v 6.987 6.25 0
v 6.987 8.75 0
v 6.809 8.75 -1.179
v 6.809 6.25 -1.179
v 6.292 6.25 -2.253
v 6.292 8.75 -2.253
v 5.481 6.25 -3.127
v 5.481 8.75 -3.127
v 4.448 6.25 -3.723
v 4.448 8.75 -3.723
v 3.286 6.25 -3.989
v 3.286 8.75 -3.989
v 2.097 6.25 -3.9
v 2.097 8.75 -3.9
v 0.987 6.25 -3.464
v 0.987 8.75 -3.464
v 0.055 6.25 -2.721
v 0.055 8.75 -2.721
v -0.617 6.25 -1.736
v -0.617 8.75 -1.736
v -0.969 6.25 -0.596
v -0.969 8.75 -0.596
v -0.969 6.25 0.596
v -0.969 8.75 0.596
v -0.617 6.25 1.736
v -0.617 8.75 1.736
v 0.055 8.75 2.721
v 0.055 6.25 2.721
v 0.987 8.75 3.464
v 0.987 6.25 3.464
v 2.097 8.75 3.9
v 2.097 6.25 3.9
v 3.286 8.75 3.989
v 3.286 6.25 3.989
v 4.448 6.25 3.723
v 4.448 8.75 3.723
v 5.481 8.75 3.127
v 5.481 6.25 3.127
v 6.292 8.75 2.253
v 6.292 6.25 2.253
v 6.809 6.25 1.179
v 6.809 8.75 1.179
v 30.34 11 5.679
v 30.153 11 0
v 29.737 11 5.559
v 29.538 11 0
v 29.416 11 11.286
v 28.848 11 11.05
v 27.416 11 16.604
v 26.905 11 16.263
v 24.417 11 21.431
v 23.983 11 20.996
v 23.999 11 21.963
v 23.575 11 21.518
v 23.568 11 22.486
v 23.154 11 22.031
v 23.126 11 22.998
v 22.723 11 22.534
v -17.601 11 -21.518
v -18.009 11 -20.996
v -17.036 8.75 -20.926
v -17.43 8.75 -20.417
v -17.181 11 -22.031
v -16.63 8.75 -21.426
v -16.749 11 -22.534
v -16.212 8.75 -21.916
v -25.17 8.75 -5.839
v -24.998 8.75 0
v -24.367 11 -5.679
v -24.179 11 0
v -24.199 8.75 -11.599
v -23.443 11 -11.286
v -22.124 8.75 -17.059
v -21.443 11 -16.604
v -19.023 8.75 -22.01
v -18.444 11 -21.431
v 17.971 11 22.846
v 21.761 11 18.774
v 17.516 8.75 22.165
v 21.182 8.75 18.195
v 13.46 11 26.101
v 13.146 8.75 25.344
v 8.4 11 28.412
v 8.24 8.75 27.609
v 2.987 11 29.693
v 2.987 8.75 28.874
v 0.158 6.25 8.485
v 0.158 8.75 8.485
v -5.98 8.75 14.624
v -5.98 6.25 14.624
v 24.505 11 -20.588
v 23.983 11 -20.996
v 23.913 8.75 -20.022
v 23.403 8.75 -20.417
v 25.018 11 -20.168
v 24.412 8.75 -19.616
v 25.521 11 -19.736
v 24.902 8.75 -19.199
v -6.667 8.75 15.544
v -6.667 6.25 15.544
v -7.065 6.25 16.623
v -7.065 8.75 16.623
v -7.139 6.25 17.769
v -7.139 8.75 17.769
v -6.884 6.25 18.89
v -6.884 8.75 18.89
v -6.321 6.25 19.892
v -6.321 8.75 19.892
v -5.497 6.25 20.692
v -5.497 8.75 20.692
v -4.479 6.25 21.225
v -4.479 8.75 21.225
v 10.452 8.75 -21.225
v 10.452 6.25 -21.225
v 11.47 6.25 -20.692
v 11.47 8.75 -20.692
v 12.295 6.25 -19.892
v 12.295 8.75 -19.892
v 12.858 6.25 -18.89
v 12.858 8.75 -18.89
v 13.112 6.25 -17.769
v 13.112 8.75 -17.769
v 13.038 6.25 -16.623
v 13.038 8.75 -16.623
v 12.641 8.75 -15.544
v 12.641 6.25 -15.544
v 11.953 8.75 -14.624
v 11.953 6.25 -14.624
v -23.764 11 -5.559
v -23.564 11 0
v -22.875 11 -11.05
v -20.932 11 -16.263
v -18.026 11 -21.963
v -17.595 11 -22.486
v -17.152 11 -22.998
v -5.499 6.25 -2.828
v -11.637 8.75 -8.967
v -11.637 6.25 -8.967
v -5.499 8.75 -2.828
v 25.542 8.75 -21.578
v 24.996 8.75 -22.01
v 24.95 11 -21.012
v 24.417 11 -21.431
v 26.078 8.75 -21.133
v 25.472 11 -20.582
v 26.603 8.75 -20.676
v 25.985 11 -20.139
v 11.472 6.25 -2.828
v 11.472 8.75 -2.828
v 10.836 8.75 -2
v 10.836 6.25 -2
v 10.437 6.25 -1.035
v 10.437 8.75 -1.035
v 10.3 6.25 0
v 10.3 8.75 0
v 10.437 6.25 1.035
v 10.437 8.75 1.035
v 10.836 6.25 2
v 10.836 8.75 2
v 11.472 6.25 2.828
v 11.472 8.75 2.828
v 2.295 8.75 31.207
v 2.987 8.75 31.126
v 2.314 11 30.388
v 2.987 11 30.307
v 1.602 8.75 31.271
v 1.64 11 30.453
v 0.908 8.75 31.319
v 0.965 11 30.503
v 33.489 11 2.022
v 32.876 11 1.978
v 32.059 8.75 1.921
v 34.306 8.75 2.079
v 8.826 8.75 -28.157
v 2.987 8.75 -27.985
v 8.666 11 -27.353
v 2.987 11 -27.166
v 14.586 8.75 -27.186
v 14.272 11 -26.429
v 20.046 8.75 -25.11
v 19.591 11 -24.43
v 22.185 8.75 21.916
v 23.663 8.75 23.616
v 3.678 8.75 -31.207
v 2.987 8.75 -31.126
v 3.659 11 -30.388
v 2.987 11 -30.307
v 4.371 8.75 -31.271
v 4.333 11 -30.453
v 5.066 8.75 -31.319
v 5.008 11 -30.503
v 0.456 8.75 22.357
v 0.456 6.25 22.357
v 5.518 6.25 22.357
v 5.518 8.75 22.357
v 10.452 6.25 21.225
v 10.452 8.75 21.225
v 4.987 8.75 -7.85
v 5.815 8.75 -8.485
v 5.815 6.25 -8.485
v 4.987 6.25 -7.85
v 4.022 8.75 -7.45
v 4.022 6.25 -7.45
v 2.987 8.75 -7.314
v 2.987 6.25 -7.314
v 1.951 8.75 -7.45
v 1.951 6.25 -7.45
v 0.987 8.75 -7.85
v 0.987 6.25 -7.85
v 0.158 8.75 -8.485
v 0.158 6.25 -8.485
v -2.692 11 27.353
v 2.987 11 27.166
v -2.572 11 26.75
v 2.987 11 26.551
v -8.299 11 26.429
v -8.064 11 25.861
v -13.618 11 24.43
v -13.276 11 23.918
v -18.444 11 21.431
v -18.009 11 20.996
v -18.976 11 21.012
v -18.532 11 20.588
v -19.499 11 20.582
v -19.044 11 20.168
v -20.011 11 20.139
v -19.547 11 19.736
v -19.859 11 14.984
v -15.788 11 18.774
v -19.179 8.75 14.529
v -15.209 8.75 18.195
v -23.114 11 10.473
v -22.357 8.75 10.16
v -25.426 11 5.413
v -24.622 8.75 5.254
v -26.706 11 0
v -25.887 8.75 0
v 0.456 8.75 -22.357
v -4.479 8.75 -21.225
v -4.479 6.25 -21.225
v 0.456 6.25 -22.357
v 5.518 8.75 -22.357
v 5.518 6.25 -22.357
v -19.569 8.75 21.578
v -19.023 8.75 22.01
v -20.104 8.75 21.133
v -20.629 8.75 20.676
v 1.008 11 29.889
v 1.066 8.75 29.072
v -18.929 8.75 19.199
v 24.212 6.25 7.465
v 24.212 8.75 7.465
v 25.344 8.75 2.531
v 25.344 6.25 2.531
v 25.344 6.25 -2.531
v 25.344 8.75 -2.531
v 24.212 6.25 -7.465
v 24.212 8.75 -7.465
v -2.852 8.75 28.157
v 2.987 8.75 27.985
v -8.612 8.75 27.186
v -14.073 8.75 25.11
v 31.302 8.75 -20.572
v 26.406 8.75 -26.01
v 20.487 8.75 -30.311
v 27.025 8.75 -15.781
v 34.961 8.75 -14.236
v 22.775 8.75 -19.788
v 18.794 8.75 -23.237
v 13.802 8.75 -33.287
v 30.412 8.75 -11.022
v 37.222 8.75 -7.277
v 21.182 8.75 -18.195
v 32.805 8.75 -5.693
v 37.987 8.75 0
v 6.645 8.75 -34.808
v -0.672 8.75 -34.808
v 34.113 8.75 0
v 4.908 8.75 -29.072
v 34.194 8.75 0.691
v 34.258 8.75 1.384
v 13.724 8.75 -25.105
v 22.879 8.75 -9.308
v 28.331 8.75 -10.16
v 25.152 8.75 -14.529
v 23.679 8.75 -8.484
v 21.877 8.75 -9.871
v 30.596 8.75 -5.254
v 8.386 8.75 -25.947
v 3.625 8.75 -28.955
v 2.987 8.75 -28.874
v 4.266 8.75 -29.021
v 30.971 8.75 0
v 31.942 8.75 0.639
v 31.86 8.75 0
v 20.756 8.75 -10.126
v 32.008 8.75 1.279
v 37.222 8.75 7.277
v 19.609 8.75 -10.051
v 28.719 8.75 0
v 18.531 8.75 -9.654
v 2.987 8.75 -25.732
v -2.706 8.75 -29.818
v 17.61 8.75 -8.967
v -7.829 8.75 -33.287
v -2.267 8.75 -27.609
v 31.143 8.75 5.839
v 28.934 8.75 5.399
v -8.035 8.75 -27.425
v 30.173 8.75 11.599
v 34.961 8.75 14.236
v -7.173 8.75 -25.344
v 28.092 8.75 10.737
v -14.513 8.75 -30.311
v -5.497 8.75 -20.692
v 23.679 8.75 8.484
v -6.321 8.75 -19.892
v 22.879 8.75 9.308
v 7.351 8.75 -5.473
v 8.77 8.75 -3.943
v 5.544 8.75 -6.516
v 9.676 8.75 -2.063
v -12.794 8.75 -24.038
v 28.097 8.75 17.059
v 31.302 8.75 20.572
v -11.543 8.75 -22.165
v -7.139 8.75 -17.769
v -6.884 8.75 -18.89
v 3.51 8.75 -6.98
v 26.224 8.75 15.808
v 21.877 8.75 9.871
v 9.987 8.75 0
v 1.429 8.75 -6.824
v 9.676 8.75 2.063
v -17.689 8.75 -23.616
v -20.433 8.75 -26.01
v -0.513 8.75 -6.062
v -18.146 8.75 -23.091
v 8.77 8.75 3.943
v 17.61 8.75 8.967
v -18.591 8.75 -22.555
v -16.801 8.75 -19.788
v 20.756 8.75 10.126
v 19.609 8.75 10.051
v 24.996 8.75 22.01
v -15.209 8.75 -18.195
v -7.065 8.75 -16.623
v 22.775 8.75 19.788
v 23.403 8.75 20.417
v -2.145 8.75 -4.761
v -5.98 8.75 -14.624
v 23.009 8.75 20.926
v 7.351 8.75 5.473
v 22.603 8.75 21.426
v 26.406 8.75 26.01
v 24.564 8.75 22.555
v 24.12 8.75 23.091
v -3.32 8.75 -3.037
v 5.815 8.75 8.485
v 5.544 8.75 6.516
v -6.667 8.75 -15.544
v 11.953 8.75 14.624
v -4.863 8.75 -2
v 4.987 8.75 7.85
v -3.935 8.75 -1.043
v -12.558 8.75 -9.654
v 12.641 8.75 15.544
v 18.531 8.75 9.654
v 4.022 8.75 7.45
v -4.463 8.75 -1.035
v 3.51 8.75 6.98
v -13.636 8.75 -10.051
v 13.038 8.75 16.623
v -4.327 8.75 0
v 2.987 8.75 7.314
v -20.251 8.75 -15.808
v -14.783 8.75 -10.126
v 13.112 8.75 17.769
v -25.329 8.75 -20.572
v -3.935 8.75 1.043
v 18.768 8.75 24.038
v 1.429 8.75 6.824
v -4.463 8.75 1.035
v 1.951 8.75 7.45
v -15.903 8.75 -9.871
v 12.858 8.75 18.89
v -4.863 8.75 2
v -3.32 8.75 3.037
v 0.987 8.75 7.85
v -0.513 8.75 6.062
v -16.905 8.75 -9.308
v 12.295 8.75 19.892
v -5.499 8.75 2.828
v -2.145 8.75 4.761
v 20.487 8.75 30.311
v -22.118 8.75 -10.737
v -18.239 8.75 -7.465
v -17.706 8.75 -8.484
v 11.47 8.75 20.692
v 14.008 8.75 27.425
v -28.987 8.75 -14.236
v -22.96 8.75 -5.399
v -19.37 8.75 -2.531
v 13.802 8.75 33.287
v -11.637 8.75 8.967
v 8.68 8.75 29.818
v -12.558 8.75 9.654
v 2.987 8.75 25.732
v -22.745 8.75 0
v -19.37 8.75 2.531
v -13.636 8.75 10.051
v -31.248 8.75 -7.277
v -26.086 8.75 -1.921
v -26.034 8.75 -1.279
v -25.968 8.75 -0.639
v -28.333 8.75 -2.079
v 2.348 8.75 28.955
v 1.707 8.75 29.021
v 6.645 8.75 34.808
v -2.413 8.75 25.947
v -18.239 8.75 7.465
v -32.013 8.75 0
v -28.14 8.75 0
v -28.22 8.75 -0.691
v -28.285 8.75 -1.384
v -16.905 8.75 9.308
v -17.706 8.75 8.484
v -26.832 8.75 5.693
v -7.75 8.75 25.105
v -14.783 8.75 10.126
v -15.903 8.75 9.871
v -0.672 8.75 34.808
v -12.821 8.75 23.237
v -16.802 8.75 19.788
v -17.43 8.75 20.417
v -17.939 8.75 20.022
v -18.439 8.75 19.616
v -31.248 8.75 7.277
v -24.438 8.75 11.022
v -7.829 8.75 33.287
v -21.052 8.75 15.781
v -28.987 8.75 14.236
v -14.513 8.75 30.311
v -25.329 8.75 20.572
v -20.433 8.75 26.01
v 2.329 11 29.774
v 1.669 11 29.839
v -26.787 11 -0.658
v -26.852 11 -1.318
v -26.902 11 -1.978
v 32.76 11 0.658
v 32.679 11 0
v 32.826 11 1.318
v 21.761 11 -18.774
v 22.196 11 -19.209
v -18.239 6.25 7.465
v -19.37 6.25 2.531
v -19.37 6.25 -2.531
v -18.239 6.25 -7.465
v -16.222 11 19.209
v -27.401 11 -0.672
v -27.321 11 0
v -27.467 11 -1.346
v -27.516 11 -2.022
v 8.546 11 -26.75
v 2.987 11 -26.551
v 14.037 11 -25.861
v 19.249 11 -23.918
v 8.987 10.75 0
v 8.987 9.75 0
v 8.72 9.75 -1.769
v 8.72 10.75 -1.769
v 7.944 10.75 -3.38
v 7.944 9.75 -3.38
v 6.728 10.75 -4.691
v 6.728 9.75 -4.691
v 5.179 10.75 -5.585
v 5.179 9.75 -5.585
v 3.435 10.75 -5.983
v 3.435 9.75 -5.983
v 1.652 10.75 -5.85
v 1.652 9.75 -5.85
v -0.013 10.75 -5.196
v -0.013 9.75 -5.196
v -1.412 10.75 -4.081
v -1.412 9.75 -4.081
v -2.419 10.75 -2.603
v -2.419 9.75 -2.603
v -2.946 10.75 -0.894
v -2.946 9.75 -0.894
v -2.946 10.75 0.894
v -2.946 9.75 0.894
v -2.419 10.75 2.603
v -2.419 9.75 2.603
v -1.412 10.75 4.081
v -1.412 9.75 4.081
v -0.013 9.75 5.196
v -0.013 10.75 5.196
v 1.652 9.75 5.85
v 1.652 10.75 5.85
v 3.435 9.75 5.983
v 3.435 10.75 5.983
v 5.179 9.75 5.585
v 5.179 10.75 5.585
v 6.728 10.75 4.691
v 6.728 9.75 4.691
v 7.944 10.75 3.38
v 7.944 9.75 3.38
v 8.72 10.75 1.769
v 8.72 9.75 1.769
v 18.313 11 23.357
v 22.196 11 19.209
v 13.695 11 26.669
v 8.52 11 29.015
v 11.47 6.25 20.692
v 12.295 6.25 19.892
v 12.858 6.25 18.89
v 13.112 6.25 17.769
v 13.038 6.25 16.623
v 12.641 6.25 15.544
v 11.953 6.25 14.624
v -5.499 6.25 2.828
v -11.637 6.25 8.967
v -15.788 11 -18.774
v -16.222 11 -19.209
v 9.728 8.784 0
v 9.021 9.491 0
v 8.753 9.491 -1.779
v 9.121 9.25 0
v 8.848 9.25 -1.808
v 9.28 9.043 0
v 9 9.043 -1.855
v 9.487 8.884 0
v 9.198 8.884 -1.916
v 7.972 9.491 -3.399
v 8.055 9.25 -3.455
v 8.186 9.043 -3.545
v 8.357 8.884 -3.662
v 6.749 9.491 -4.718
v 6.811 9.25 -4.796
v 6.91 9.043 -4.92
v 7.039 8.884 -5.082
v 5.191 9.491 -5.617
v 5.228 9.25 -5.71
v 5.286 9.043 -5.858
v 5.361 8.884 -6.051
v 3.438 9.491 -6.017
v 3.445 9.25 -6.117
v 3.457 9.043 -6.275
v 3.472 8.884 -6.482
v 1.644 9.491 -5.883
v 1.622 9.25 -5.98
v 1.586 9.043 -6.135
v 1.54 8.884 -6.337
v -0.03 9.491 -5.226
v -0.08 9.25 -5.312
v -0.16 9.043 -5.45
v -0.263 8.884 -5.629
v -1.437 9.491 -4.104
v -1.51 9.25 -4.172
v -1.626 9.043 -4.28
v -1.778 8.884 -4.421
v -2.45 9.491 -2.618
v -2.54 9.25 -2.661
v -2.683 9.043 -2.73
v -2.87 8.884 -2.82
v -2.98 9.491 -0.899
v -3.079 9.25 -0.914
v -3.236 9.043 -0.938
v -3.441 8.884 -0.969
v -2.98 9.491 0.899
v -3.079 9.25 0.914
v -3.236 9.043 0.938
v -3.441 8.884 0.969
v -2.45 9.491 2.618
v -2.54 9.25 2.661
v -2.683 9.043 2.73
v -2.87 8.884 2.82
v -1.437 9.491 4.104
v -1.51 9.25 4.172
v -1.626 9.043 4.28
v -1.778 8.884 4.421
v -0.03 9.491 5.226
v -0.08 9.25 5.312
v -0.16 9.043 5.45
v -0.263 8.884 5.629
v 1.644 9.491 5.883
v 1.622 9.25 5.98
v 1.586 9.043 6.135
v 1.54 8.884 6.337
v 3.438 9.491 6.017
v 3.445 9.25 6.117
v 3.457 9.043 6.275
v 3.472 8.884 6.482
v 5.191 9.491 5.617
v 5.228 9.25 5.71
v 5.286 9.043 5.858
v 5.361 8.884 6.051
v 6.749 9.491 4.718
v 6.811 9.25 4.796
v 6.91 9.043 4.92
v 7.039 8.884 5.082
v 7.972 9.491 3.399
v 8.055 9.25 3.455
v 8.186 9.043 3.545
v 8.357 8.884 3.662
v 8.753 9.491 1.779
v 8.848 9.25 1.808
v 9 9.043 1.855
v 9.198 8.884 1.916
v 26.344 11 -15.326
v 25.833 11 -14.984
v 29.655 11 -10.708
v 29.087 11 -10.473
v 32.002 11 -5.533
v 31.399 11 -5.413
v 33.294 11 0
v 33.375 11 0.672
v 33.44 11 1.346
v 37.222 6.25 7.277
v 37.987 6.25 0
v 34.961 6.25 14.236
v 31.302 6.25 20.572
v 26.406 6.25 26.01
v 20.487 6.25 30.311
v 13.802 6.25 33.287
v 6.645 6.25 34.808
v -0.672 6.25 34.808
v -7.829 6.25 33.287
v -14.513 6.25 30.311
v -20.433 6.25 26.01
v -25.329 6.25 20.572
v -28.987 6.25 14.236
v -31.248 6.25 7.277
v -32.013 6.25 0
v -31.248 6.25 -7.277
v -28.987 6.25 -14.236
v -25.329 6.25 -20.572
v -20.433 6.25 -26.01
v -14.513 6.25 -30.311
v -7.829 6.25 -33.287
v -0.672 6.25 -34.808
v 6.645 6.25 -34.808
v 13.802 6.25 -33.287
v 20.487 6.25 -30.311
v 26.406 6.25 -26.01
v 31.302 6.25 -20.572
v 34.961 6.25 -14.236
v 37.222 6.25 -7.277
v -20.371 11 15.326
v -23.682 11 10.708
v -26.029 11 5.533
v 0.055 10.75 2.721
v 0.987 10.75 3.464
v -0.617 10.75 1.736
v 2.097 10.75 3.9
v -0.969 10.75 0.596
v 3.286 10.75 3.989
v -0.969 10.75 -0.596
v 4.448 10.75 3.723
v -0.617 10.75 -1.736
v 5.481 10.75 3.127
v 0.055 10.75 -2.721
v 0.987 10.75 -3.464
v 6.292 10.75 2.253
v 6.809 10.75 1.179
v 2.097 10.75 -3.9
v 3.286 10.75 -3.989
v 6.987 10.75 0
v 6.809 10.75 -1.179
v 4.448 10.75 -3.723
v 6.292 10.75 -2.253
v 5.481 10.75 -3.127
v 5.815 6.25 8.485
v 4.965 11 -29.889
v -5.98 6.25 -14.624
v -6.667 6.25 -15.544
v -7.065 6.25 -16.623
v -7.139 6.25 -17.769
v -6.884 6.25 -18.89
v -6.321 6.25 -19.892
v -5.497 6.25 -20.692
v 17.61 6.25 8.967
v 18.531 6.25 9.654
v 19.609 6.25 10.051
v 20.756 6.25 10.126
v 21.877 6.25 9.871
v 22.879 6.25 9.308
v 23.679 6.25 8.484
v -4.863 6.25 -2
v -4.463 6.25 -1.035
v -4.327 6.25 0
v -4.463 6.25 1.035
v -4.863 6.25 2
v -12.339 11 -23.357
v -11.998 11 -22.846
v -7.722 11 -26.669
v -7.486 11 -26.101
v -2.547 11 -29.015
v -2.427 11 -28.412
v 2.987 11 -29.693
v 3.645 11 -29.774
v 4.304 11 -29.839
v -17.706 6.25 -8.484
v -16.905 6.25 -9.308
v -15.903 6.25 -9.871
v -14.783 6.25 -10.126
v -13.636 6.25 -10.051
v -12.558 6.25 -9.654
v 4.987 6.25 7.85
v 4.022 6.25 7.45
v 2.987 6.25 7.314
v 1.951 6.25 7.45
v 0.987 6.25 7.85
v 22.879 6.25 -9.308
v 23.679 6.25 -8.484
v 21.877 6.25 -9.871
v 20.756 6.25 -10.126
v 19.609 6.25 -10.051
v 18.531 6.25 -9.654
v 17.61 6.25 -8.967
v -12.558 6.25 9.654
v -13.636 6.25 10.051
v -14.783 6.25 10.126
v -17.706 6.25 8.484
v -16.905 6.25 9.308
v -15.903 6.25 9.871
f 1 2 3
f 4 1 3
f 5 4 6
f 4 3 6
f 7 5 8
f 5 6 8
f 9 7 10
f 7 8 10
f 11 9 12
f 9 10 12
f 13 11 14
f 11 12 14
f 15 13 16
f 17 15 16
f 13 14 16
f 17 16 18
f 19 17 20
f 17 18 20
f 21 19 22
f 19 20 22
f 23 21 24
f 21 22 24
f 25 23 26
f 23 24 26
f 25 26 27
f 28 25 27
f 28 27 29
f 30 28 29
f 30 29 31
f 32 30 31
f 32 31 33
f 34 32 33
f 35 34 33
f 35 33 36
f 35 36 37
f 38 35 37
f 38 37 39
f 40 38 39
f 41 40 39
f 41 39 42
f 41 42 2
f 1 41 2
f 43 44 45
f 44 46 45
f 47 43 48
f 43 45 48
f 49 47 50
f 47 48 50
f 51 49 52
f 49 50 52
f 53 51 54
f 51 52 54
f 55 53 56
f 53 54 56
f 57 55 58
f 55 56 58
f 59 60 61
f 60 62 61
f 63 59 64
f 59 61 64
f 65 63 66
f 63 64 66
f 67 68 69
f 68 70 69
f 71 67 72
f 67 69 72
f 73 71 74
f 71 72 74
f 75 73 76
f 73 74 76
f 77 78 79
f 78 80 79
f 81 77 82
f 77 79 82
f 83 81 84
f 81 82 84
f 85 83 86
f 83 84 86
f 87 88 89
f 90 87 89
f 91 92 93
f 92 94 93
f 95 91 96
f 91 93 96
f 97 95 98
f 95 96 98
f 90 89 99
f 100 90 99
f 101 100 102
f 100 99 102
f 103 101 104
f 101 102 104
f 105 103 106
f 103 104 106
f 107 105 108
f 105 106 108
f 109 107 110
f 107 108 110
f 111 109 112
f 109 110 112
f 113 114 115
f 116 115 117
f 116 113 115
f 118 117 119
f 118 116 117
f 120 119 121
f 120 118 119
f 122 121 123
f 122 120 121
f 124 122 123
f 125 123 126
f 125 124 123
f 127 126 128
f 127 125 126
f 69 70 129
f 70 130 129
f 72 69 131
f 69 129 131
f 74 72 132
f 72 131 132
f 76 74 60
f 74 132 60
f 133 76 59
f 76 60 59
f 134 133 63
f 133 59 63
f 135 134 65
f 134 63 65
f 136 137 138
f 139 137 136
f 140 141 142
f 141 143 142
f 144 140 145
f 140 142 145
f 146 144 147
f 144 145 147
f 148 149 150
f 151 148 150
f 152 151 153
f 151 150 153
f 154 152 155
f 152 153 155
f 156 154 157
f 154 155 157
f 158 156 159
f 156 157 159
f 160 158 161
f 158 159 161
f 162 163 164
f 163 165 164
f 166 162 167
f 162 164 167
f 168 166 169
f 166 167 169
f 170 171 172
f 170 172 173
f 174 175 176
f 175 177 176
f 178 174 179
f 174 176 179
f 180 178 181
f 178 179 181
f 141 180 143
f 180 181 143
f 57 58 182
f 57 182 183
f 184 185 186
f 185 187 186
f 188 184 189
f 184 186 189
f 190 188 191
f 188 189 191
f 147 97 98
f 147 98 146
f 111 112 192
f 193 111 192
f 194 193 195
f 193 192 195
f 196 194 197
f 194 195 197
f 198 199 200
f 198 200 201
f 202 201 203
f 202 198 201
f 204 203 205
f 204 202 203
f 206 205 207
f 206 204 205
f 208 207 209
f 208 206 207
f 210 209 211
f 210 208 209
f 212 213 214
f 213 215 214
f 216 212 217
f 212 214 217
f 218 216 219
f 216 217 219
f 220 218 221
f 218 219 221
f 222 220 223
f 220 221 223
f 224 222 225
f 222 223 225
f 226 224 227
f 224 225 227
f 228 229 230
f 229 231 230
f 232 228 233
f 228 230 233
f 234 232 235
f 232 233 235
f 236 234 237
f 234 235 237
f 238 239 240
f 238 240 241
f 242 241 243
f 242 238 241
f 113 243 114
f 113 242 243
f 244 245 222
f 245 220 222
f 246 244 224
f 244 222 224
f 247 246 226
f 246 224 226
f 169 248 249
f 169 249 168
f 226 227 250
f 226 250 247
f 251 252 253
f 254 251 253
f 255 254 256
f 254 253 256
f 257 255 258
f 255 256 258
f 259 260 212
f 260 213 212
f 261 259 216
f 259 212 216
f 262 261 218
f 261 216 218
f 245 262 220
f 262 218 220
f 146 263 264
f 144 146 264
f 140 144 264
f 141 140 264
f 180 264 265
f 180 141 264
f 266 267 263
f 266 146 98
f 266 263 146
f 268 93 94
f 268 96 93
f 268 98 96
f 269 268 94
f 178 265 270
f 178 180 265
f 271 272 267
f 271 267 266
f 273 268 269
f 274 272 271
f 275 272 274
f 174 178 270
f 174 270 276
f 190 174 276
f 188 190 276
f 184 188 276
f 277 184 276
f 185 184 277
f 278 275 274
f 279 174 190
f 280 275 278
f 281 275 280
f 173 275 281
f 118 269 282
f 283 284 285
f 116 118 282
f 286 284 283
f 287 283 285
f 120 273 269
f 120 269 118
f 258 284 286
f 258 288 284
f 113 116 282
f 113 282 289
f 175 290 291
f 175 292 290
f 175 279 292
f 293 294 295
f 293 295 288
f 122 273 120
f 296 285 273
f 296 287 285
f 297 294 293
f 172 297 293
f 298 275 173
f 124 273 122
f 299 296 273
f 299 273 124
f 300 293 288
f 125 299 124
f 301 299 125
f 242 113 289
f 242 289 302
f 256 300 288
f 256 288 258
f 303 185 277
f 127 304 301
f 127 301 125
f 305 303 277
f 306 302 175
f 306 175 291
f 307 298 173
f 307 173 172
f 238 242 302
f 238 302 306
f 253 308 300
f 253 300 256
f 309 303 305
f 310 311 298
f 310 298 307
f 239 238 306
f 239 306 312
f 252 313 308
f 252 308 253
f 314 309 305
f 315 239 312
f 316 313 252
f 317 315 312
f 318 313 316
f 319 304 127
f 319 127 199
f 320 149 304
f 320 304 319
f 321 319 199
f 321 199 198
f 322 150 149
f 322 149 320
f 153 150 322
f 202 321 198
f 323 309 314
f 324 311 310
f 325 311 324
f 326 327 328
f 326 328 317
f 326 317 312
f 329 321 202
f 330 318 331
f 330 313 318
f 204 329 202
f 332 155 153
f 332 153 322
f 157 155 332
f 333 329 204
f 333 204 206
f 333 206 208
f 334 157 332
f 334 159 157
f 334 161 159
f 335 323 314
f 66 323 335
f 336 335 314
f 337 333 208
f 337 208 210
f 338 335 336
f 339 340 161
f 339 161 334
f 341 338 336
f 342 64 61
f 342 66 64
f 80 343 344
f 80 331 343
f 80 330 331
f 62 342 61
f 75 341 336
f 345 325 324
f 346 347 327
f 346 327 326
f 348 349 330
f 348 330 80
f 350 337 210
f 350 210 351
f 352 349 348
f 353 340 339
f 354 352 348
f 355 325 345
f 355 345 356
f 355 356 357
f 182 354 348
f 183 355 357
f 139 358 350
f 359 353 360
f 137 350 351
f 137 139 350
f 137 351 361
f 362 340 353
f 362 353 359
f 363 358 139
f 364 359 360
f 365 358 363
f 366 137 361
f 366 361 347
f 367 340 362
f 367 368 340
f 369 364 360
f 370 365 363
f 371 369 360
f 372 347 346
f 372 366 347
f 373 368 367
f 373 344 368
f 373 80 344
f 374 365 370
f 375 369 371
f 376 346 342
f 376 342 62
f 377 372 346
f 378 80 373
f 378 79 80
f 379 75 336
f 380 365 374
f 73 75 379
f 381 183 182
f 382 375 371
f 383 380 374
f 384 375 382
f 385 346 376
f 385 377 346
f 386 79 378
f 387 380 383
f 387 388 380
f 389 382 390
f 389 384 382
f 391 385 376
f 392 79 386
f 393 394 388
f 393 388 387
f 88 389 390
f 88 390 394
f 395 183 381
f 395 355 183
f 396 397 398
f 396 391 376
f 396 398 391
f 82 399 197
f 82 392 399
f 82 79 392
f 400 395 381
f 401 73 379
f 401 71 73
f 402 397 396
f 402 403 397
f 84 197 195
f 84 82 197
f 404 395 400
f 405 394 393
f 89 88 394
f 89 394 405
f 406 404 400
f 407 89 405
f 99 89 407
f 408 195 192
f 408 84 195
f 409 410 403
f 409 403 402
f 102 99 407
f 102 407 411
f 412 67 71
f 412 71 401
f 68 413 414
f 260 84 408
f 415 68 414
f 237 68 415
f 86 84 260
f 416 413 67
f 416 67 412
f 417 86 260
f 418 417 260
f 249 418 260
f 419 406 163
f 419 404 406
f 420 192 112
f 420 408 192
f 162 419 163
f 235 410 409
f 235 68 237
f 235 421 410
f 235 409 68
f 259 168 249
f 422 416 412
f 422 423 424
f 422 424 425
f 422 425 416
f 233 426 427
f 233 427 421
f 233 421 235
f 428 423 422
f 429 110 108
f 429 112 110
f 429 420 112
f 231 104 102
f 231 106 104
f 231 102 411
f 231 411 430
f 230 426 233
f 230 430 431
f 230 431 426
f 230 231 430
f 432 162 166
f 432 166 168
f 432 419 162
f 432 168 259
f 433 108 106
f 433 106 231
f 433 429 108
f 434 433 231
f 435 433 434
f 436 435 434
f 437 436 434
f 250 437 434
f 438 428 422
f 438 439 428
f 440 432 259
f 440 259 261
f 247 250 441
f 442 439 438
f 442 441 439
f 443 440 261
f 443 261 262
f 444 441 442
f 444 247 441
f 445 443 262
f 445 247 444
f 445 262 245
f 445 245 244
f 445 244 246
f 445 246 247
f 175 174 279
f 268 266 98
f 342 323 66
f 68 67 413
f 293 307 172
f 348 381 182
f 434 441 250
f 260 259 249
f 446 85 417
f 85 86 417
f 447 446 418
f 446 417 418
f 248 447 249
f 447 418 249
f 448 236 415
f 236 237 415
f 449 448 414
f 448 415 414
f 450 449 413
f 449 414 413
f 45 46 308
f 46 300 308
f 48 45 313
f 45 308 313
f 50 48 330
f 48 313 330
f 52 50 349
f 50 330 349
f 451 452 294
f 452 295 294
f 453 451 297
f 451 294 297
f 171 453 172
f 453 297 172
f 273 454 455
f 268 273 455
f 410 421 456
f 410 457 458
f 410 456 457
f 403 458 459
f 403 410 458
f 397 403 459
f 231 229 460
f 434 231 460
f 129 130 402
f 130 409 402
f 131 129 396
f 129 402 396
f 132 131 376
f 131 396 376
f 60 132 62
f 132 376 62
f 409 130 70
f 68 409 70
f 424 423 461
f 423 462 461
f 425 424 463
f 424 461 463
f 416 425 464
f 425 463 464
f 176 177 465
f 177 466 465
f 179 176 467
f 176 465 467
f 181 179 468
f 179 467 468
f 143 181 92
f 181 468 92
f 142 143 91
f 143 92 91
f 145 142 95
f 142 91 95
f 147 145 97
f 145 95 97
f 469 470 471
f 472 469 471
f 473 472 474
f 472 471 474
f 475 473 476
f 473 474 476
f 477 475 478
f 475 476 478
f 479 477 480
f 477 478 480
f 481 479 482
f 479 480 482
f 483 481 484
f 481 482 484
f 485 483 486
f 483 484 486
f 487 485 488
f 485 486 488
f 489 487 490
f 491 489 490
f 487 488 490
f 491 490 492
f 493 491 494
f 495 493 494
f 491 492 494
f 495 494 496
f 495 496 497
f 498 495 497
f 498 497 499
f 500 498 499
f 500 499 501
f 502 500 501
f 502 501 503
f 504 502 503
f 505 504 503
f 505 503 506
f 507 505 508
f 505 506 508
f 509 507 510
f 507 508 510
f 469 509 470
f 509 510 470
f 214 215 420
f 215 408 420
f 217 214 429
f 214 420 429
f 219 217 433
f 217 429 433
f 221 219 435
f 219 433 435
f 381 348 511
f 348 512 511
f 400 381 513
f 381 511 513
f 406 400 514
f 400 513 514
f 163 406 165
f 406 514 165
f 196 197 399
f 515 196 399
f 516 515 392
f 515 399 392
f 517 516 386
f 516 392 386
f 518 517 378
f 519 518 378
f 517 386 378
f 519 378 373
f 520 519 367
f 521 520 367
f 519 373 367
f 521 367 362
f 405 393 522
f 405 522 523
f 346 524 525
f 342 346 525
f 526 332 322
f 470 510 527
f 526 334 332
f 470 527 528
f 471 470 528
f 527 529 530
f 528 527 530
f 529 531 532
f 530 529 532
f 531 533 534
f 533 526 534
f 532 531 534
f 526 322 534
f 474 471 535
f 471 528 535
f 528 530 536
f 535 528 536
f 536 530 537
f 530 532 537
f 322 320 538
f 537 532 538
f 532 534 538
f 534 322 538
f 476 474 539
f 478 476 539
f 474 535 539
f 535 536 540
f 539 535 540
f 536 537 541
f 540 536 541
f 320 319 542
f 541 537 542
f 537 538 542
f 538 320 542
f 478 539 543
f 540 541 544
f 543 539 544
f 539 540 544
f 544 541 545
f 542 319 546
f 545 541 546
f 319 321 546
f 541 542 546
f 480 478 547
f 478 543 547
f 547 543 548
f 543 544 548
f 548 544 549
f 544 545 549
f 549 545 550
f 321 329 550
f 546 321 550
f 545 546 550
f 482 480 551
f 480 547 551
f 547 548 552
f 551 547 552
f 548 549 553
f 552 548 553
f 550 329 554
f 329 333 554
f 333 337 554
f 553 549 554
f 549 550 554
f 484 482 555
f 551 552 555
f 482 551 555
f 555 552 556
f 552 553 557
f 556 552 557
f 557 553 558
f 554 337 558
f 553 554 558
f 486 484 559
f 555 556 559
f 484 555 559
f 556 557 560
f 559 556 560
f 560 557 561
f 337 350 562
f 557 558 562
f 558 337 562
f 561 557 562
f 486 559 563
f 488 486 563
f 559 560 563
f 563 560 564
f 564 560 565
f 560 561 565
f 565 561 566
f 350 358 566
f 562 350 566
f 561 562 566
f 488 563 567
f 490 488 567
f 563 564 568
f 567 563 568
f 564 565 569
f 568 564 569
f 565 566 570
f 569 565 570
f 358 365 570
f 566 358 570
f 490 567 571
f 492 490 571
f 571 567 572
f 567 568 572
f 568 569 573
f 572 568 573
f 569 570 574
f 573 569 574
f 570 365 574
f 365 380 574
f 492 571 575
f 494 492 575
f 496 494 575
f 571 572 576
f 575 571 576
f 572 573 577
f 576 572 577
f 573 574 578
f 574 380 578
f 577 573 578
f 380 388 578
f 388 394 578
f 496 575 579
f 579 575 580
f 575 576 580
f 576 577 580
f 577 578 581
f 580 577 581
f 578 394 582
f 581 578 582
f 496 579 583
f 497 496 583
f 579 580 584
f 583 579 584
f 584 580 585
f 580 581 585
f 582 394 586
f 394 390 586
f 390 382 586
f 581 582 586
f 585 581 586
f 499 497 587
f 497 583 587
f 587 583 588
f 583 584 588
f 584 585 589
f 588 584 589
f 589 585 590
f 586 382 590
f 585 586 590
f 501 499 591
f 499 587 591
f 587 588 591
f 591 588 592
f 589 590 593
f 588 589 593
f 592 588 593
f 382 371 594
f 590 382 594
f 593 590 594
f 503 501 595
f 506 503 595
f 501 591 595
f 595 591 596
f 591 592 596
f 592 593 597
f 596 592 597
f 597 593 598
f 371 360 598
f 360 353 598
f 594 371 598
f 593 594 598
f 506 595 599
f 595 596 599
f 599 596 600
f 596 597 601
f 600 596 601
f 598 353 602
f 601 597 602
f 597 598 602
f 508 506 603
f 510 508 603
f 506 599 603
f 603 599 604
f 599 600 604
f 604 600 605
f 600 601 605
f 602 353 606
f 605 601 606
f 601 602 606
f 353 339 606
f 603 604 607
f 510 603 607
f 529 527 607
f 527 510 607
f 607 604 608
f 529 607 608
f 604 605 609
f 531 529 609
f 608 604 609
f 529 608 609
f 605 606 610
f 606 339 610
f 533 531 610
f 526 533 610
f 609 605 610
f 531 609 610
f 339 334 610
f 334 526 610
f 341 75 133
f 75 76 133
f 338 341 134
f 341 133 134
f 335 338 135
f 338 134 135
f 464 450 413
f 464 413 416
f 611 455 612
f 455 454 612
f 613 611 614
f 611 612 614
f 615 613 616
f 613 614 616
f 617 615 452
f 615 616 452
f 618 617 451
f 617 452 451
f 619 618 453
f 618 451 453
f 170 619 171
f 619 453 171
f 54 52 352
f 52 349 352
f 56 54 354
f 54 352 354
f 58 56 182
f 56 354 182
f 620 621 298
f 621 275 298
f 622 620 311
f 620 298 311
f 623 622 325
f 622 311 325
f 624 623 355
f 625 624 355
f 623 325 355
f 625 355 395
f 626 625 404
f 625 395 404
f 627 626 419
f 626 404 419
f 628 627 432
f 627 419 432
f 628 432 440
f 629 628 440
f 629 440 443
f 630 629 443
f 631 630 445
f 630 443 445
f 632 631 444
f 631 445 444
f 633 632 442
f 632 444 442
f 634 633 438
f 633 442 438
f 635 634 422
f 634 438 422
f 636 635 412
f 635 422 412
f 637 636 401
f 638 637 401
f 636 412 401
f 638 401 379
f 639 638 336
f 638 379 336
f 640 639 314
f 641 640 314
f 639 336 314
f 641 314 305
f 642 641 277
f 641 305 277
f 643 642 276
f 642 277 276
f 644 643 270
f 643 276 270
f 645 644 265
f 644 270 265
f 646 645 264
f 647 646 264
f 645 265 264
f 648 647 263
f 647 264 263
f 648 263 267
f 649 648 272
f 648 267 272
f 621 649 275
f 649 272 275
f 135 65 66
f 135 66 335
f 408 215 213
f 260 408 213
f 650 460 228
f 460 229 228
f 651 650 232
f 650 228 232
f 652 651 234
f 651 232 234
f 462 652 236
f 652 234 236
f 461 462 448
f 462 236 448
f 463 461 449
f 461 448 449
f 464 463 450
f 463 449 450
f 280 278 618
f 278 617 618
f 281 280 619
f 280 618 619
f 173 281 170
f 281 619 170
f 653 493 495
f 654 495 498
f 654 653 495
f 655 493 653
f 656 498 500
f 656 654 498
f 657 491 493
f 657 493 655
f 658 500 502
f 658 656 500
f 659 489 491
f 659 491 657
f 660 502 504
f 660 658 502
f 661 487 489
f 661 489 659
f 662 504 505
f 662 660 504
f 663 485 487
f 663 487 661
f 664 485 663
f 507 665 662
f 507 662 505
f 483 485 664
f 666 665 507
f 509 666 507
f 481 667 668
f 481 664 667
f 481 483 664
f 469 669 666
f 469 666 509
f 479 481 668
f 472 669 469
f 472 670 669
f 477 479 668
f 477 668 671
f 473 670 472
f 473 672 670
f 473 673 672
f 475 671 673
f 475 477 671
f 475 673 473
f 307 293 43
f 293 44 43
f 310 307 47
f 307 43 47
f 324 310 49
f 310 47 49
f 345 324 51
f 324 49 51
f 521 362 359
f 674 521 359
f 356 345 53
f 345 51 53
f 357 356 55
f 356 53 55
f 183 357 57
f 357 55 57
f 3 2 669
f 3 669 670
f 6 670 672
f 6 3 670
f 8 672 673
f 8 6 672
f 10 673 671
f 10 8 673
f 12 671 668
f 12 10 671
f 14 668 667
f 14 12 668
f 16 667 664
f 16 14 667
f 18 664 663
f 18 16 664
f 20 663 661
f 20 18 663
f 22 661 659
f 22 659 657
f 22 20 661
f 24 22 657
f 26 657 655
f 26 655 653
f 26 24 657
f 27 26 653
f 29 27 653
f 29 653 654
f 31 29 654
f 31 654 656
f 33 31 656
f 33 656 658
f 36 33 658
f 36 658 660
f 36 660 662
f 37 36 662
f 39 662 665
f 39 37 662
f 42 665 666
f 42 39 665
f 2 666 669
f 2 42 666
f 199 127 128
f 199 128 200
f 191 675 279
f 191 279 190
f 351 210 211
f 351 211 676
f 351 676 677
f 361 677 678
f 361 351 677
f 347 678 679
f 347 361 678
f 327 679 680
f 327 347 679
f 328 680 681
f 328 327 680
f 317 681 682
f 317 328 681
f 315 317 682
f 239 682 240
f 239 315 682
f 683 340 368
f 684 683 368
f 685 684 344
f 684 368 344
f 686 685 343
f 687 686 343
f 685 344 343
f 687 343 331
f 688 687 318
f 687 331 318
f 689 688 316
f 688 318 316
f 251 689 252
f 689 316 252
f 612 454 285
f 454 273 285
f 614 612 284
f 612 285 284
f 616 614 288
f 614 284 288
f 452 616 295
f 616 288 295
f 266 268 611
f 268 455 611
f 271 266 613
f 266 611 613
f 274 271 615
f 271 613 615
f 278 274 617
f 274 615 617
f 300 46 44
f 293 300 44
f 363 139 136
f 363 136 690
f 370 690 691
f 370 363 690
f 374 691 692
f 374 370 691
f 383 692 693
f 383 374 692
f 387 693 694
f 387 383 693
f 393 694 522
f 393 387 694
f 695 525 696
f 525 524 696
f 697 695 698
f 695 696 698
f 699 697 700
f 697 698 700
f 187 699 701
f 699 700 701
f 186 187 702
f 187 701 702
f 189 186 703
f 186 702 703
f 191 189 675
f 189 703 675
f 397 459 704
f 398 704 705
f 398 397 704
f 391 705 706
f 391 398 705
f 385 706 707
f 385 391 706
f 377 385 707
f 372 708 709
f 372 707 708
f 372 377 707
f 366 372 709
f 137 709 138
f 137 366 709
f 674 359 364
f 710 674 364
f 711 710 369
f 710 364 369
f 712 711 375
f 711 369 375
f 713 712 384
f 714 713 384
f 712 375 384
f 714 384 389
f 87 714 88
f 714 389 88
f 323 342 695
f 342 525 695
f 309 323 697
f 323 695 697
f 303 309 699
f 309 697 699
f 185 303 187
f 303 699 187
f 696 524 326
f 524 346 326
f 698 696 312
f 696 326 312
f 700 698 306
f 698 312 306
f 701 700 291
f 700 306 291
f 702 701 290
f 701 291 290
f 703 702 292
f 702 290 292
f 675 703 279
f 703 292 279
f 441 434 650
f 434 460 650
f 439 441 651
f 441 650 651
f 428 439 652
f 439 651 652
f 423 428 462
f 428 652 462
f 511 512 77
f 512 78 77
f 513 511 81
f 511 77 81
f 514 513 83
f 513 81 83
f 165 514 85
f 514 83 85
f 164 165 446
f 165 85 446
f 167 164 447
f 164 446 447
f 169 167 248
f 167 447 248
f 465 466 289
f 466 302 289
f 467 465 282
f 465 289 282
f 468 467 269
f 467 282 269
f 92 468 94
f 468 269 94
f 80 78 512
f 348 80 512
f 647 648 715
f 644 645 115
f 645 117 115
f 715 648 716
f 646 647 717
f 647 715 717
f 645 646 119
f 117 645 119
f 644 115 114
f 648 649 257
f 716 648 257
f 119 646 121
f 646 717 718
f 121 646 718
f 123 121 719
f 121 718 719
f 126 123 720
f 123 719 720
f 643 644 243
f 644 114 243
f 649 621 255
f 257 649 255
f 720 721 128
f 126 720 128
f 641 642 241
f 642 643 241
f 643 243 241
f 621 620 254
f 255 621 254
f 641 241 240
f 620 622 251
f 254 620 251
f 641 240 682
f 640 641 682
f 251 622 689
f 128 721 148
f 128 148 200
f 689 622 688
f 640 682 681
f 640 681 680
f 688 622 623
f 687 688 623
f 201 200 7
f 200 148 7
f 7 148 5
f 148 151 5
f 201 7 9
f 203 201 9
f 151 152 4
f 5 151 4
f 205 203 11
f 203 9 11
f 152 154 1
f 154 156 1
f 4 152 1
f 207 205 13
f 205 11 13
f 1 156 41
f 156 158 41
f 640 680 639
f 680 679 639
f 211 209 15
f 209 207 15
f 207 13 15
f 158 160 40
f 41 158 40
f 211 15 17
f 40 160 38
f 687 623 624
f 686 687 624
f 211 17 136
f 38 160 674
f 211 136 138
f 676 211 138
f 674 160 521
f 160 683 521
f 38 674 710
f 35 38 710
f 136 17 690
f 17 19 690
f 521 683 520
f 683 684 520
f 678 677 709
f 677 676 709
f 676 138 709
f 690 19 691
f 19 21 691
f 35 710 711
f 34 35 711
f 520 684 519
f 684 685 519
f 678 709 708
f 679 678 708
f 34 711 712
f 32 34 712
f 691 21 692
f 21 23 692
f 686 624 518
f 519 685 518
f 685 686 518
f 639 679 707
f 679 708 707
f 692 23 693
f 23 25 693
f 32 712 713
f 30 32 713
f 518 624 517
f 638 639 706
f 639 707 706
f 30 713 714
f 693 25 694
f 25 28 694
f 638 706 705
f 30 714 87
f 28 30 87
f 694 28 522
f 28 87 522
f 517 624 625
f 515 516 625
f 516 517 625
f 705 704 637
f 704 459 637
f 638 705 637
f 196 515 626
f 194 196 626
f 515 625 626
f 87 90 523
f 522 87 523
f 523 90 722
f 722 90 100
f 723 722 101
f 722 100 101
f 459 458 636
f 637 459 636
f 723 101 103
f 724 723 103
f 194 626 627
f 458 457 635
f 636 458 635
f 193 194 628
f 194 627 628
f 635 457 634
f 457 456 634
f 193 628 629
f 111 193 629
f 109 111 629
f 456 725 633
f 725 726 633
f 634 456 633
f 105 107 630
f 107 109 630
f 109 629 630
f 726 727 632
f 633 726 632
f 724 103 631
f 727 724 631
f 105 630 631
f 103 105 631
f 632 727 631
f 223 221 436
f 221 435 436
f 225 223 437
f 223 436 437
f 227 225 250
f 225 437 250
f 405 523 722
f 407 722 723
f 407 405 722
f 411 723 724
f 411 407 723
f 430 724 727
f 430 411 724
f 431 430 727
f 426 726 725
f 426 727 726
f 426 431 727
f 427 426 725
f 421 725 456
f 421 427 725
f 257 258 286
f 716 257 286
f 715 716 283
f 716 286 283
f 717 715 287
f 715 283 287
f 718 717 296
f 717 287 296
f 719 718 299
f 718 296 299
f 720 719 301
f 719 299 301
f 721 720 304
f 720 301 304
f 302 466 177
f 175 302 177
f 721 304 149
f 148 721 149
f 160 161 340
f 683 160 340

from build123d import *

# Parameters (mm, degrees)
SKETCH2_W           = 35
SKETCH2_H           = 2.5
SKETCH3_R           = 4
CUT_EXTRUDE1_DEPTH  = 3.5
CIRPATTERN1_COUNT   = 8
SKETCH11_R          = 6
SKETCH11_R_2        = 4
BOSS_EXTRUDE1_DEPTH = 2
FILLET1_R           = 1


with BuildPart() as part:
    # Sketch2 → Revolve1 (revolve)
    with BuildSketch(Plane.XY):
        with Locations((20.486722825, 7.5)):
            Rectangle(SKETCH2_W, SKETCH2_H)
    revolve(axis=Axis((2.986722825, 8.75, 0), (0, -1, 0)))

    # Sketch3 → Cut-Extrude1 (cut, through all)
    with BuildSketch(Plane(origin=(0, 8.75, 0), x_dir=(1, 0, 0), z_dir=(0, 1, 0))):
        with Locations((2.986722825, 0)):
            Circle(SKETCH3_R)
        with BuildLine():
            Line((11.953421812, 14.623553237), (5.81514995, 8.485281374))
            ThreePointArc((5.81514995, 8.485281374), (2.986722825, 7.313708499), (0.1582957, 8.485281374))
            Line((0.1582957, 8.485281374), (-5.979976162, 14.623553237))
            ThreePointArc((-5.979976162, 14.623553237), (-7.051976031, 18.338924141), (-4.478742954, 21.225381521))
            ThreePointArc((-4.478742954, 21.225381521), (2.986722825, 22.5), (10.452188604, 21.225381521))
            ThreePointArc((10.452188604, 21.225381521), (13.025421681, 18.338924141), (11.953421812, 14.623553237))
        make_face()
        with BuildLine():
            Line((11.953421812, -14.623553237), (5.81514995, -8.485281374))
            ThreePointArc((5.81514995, -8.485281374), (2.986722825, -7.313708499), (0.1582957, -8.485281374))
            Line((0.1582957, -8.485281374), (-5.979976162, -14.623553237))
            ThreePointArc((-5.979976162, -14.623553237), (-7.051976031, -18.338924141), (-4.478742954, -21.225381521))
            ThreePointArc((-4.478742954, -21.225381521), (2.986722825, -22.5), (10.452188604, -21.225381521))
            ThreePointArc((10.452188604, -21.225381521), (13.025421681, -18.338924141), (11.953421812, -14.623553237))
        make_face()
        with BuildLine():
            Line((-11.636830412, 8.966698987), (-5.498558549, 2.828427125))
            ThreePointArc((-5.498558549, 2.828427125), (-4.326985674, 0), (-5.498558549, -2.828427125))
            Line((-5.498558549, -2.828427125), (-11.636830412, -8.966698987))
            ThreePointArc((-11.636830412, -8.966698987), (-15.352201316, -10.038698856), (-18.238658696, -7.465465779))
            ThreePointArc((-18.238658696, -7.465465779), (-19.513277175, 0), (-18.238658696, 7.465465779))
            ThreePointArc((-18.238658696, 7.465465779), (-15.352201316, 10.038698856), (-11.636830412, 8.966698987))
        make_face()
        with BuildLine():
            Line((17.610276062, 8.966698987), (11.472004199, 2.828427125))
            ThreePointArc((11.472004199, 2.828427125), (10.300431324, 0), (11.472004199, -2.828427125))
            Line((11.472004199, -2.828427125), (17.610276062, -8.966698987))
            ThreePointArc((17.610276062, -8.966698987), (21.325646966, -10.038698856), (24.212104346, -7.465465779))
            ThreePointArc((24.212104346, -7.465465779), (25.486722825, 0), (24.212104346, 7.465465779))
            ThreePointArc((24.212104346, 7.465465779), (21.325646966, 10.038698856), (17.610276062, 8.966698987))
        make_face()
    extrude(amount=-CUT_EXTRUDE1_DEPTH, mode=Mode.SUBTRACT)

    # Sweep2: sweep along a path in Sketch9
    with BuildLine(Plane(origin=(0, 8.75, 0), x_dir=(1, 0, 0), z_dir=(0, 1, 0))) as sweep2_path:
        ThreePointArc((21.978484794, 18.991761969), (29.371276645, 10.5906167), (32.986722825, 0))
        ThreePointArc((32.986722825, 0), (33.102162214, -0.998284421), (33.182560833, -2))
    # Sketch1 → Sweep2 (sweep)
    with BuildSketch(Plane.XY):
        Polygon((34.11308378, 8.75), (33.294150753, 11), (32.679294897, 11), (31.86036187, 8.75), align=None)
    sweep2 = sweep(path=sweep2_path.line)

    # CirPattern1: Sweep2 ×8 about axis
    cirpattern1_axis = Axis((2.986722825, 6.25, 0), (0, 1, 0))
    for i in range(1, CIRPATTERN1_COUNT):
        add(sweep2.rotate(cirpattern1_axis, i * 360 / CIRPATTERN1_COUNT))

    # Sketch11 → Boss-Extrude1 (add)
    with BuildSketch(Plane(origin=(0, 8.75, 0), x_dir=(1, 0, 0), z_dir=(0, 1, 0))):
        with Locations((2.986722825, 0)):
            Circle(SKETCH11_R)
        with Locations((2.986722825, 0)):
            Circle(SKETCH11_R_2, mode=Mode.SUBTRACT)
    extrude(amount=BOSS_EXTRUDE1_DEPTH)

    # Fillet1
    fillet1_edges = [part.edges().sort_by_distance(p)[0] for p in [
        (-3.013277175, 8.75, 0),
    ]]
    fillet(fillet1_edges, radius=FILLET1_R)


solid = part.part
